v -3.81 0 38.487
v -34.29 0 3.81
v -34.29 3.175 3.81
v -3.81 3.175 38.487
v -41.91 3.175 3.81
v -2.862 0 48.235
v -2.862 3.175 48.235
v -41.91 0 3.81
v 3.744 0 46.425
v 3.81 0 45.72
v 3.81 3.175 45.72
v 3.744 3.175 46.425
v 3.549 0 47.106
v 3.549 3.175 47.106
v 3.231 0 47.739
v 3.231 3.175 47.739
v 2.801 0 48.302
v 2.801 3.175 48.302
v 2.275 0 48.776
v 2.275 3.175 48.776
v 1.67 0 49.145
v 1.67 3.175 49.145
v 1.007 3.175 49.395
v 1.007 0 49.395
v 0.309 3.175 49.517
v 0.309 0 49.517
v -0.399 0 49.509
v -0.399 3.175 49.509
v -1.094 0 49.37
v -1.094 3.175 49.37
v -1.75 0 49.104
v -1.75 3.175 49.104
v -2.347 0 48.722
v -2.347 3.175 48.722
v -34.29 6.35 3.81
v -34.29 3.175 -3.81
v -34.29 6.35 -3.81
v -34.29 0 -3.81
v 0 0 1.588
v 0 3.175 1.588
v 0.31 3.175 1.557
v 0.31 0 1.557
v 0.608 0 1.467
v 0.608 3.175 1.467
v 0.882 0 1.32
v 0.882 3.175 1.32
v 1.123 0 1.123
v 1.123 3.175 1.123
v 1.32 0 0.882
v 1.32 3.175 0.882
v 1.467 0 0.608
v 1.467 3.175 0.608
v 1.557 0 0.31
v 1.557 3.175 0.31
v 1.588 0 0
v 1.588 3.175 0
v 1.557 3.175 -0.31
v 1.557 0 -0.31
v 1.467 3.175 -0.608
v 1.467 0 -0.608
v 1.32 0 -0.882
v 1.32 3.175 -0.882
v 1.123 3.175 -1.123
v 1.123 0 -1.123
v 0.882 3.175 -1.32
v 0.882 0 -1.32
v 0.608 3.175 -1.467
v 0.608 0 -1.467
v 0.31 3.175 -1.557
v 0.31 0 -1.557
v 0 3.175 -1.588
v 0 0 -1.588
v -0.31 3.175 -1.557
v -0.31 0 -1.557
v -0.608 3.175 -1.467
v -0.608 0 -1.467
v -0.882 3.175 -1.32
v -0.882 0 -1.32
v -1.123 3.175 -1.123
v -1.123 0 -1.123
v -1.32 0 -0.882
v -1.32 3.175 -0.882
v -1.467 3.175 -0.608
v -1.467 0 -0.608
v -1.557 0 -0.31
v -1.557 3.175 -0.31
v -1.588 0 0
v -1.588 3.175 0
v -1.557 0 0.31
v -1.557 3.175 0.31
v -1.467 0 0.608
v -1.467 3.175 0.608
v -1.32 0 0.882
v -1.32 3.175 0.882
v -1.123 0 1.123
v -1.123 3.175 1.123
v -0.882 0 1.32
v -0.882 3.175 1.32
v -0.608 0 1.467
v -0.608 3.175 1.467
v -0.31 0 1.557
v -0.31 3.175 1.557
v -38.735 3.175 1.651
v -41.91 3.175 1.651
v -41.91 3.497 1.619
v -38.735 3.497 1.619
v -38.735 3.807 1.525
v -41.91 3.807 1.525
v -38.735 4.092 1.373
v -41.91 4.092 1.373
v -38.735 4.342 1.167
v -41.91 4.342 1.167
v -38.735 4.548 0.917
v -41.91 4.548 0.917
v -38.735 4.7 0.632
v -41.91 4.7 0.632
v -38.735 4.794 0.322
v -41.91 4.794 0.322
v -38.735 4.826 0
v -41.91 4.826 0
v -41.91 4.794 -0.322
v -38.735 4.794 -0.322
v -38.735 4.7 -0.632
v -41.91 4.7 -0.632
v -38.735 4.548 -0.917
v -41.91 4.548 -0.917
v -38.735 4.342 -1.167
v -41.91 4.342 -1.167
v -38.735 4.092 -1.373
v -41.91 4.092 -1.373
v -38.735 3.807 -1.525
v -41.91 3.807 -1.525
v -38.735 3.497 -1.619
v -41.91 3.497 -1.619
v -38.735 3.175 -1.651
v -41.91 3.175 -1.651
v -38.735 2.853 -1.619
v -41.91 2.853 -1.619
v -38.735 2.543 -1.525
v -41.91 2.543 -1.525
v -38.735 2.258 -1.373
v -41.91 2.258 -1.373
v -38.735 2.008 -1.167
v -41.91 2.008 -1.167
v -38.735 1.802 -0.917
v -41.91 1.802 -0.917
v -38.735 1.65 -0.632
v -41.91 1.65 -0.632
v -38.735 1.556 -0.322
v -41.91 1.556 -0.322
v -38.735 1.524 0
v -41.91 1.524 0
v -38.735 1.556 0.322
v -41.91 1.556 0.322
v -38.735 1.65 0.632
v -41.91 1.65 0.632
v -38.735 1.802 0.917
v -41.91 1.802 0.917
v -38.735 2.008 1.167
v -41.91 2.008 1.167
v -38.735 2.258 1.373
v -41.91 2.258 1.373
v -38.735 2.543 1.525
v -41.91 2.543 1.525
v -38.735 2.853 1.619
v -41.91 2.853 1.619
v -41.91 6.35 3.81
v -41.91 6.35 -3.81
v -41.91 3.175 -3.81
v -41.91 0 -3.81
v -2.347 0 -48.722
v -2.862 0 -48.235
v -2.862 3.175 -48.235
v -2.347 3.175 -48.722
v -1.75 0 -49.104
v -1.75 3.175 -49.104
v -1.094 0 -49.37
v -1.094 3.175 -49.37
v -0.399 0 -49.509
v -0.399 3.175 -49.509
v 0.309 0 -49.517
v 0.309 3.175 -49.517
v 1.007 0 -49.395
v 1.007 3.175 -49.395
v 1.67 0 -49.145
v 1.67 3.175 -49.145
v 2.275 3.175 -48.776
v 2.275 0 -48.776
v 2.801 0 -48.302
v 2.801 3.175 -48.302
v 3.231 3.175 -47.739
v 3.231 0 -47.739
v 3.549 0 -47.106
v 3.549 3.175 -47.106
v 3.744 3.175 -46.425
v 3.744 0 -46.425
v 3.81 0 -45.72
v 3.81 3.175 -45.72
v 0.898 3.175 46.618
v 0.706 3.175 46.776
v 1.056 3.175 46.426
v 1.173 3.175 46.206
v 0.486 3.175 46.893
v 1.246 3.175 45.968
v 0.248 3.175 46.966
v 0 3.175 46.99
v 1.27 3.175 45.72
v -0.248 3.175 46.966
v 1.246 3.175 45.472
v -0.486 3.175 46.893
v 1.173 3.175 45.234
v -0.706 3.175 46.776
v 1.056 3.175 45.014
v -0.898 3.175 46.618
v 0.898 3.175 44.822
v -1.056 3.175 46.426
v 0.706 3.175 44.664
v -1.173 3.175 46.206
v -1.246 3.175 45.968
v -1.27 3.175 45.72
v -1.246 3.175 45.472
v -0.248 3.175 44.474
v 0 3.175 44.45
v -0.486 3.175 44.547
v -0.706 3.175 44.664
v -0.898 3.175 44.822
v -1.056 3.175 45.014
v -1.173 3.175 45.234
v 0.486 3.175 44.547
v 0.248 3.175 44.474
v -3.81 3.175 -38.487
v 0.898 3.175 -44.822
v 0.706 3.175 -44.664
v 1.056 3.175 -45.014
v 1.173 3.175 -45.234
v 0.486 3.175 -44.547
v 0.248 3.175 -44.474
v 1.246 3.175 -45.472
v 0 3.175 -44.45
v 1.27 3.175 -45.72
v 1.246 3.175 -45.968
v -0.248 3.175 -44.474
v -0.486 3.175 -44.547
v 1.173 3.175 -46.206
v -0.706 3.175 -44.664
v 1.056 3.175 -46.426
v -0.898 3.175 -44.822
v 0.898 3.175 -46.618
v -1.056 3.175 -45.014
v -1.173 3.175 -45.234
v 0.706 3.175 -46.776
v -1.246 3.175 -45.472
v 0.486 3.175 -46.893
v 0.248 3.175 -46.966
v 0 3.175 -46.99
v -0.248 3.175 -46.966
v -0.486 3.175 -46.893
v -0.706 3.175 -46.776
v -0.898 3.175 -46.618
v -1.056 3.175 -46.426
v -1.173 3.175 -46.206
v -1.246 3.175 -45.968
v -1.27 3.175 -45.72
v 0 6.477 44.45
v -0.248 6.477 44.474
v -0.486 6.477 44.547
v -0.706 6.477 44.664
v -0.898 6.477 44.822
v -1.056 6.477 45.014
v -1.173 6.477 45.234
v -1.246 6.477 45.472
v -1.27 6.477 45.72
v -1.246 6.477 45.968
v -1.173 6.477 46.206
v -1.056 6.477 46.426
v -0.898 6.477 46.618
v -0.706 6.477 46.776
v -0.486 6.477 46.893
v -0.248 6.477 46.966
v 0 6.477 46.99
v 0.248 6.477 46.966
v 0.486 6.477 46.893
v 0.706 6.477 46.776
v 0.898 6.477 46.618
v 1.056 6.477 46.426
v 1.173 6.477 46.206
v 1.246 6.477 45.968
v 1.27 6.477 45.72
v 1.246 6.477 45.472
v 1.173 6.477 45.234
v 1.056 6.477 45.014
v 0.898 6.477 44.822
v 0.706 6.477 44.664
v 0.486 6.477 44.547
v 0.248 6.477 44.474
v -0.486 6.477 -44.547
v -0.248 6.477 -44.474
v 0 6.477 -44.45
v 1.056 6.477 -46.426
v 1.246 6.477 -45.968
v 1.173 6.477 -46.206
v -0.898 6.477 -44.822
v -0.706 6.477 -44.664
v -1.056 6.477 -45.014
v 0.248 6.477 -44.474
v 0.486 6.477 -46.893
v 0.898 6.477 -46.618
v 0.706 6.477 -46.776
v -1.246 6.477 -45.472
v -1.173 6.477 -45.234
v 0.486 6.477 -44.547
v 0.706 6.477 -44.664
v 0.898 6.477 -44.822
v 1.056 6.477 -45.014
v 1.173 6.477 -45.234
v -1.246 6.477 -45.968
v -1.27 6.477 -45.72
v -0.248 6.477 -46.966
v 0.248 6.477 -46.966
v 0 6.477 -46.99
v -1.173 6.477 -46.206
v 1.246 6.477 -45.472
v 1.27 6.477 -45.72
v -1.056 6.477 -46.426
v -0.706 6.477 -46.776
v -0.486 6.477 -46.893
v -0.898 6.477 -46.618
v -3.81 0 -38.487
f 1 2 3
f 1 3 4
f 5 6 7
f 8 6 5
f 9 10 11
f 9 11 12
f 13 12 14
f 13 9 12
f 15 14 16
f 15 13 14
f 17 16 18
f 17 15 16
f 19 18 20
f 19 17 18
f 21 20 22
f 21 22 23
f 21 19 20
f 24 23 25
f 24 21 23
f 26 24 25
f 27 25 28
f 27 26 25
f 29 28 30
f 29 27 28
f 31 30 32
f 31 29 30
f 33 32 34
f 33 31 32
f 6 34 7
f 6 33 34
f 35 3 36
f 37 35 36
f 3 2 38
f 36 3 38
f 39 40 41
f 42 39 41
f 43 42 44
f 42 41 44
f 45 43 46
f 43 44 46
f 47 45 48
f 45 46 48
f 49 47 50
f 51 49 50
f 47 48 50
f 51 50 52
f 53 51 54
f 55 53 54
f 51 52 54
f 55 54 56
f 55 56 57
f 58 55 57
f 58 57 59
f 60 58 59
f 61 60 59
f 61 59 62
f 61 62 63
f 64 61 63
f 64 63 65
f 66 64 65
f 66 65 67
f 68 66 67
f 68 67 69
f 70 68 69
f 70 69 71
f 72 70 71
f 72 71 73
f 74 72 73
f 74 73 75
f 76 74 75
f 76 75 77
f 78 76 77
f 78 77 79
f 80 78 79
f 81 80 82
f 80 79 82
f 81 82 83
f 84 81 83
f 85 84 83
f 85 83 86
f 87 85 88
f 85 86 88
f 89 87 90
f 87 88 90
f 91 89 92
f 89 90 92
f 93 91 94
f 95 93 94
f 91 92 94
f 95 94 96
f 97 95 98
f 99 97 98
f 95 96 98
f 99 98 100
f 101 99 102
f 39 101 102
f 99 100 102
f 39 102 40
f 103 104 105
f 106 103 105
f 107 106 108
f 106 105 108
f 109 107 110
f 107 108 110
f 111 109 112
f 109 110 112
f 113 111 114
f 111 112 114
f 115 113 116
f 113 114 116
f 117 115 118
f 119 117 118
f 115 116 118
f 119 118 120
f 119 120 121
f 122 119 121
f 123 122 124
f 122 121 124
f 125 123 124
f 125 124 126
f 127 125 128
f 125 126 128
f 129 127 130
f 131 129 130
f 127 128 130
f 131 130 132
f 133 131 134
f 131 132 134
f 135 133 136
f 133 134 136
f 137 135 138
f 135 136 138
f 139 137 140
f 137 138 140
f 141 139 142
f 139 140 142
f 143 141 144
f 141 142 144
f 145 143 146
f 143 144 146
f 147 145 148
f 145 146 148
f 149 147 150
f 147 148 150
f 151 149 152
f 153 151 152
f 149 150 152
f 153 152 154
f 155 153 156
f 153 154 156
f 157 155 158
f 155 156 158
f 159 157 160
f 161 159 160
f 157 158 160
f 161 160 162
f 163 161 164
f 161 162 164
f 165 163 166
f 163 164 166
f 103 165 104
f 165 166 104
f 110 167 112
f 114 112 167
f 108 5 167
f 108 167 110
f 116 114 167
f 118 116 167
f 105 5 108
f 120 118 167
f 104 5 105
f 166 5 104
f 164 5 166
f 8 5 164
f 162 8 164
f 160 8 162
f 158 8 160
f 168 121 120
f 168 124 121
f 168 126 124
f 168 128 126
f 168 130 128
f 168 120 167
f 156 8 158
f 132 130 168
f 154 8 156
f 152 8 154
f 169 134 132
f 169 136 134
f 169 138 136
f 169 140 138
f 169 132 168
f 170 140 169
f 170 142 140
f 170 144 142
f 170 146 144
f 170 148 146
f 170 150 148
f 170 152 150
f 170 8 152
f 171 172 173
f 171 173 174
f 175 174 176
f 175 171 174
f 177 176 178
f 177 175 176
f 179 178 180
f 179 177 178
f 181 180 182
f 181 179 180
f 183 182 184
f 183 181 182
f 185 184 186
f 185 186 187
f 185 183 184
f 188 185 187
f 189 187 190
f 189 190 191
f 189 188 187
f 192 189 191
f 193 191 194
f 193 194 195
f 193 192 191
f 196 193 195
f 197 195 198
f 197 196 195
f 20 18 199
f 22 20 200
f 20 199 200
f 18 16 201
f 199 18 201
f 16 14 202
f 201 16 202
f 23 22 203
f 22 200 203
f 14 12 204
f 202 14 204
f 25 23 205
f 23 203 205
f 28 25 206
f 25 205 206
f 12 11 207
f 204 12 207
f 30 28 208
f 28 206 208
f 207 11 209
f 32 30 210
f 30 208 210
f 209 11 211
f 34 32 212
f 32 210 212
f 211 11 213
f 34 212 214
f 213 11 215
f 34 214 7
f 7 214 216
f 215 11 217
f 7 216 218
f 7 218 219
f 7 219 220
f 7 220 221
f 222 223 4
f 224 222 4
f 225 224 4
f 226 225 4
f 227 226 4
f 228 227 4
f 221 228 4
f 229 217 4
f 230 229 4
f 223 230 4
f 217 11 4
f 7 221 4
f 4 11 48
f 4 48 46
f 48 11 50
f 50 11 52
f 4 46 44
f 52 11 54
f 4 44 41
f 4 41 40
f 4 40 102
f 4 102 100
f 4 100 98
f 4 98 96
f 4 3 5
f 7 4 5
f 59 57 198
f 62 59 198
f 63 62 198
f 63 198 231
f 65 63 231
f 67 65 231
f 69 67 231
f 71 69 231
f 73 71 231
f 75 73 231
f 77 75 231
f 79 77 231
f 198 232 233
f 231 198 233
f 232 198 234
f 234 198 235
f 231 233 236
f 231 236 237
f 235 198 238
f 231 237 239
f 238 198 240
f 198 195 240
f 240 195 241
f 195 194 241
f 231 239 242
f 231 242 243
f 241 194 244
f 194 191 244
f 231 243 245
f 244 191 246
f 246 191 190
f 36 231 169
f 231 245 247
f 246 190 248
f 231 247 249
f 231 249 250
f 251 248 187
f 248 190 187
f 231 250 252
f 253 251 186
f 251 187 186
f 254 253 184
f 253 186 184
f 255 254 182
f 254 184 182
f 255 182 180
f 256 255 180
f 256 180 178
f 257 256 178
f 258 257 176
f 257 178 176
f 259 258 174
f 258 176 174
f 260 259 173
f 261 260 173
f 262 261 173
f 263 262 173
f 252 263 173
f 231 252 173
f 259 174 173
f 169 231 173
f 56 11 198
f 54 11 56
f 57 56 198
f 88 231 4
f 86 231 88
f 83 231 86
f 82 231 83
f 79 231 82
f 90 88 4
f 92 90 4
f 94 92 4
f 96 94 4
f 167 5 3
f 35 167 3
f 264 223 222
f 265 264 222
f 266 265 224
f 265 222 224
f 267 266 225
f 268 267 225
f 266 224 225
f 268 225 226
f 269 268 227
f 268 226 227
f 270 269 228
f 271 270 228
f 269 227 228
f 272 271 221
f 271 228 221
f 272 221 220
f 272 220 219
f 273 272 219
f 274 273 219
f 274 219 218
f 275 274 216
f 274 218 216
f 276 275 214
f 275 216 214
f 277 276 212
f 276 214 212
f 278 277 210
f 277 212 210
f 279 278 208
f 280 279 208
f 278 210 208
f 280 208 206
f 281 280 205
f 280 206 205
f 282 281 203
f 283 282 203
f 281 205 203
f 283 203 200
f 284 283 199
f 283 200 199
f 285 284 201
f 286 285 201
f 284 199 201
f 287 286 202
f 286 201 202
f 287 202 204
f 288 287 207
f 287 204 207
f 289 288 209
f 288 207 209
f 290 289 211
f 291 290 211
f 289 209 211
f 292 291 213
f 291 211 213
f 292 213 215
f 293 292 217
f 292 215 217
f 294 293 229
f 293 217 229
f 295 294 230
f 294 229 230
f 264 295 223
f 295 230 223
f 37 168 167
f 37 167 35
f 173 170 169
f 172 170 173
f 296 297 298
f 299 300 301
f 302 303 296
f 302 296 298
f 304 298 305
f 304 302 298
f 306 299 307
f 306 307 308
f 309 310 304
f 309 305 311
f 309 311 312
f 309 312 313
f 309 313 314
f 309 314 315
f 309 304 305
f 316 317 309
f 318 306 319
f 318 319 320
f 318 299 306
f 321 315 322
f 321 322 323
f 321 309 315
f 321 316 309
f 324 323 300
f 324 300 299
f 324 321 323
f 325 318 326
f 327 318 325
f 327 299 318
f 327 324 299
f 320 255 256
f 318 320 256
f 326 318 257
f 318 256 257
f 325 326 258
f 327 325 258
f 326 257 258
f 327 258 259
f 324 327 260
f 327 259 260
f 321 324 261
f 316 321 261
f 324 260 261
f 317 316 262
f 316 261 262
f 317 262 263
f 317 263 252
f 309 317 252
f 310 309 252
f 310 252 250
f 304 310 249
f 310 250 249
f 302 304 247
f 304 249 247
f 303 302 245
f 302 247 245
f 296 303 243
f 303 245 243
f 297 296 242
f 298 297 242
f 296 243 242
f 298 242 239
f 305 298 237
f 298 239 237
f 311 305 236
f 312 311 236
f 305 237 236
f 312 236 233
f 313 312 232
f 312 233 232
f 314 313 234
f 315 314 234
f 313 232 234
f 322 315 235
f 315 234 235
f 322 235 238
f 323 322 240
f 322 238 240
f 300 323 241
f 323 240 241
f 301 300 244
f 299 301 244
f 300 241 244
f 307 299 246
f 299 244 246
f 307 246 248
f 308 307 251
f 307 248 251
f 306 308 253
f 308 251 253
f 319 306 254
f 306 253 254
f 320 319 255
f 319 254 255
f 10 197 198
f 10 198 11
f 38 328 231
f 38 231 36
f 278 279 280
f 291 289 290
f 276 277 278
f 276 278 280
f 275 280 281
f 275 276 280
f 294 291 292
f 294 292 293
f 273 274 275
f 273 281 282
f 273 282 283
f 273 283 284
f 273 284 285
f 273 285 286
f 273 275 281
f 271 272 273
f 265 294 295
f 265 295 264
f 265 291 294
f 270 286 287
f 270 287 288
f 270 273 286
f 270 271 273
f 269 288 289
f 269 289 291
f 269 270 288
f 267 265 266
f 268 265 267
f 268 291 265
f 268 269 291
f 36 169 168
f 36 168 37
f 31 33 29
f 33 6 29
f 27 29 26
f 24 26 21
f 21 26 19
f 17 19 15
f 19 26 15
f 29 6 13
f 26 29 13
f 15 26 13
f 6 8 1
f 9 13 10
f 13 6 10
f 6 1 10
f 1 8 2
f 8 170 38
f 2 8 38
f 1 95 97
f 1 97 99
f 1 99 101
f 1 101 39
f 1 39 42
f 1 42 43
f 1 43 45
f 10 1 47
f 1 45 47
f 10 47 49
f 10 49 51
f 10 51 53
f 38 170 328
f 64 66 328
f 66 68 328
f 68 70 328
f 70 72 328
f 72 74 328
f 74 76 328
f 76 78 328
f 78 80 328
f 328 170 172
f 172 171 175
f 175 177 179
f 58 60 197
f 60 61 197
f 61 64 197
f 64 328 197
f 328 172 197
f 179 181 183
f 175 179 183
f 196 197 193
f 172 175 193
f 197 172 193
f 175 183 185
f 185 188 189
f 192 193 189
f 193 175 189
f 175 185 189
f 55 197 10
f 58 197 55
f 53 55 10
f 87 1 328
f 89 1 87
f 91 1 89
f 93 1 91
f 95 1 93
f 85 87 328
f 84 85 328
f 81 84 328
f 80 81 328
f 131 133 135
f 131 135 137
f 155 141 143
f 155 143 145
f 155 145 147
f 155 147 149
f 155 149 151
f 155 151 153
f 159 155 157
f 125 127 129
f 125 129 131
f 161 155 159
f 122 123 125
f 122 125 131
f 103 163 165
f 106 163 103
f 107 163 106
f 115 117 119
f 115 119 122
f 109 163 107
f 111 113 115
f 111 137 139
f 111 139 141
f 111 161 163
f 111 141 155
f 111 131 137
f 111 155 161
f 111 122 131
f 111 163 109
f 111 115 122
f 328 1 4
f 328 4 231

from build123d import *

# Parameters (mm, degrees)
BOSS_EXTRUDE1_DEPTH = 3.175
SKETCH3_W           = 7.62
SKETCH3_H           = 7.62
BOSS_EXTRUDE2_DEPTH = 6.35
CUT_EXTRUDE1_REACH  = 66.96
SKETCH5_R           = 1.5875
SKETCH6_R           = 1.27
BOSS_EXTRUDE3_DEPTH = 3.302
SKETCH9_R           = 1.651
CUT_EXTRUDE3_DEPTH  = 3.175


with BuildPart() as part:
    # Sketch2 → Boss-Extrude1 (new body)
    with BuildSketch(Plane(origin=(0, 0, 0), x_dir=(1, 0, 0), z_dir=(0, 1, 0))):
        with BuildLine():
            Line((3.81, 45.72), (3.81, -45.72))
            ThreePointArc((3.81, -45.72), (1.344074772, -49.285047406), (-2.861686618, -48.235322981))
            Line((-2.861686618, -48.235322981), (-41.91, -3.81))
            Line((-41.91, -3.81), (-34.29, -3.81))
            Line((-34.29, -3.81), (-3.81, -38.487140373))
            Line((-3.81, -38.487140373), (-3.81, 38.487140373))
            Line((-3.81, 38.487140373), (-34.29, 3.81))
            Line((-34.29, 3.81), (-41.91, 3.81))
            Line((-41.91, 3.81), (-2.861686618, 48.235322981))
            ThreePointArc((-2.861686618, 48.235322981), (1.344074772, 49.285047406), (3.81, 45.72))
        make_face()
    extrude(amount=BOSS_EXTRUDE1_DEPTH)

    # Sketch3 → Boss-Extrude2 (add)
    with BuildSketch(Plane(origin=(0, 0, 0), x_dir=(1, 0, 0), z_dir=(0, 1, 0))):
        with Locations((-38.1, 0)):
            Rectangle(SKETCH3_W, SKETCH3_H)
    extrude(amount=BOSS_EXTRUDE2_DEPTH)

    # Sketch5 → Cut-Extrude1 (cut, up to next)
    with BuildSketch(Plane(origin=(0, 3.175, 0), x_dir=(1, 0, 0), z_dir=(0, 1, 0)), mode=Mode.PRIVATE) as cut_extrude1_sk1:
        with Locations(Location((0, 0, 0), (0, 0, 270))):
            Circle(SKETCH5_R)
    cut_extrude1_tool1 = extrude(cut_extrude1_sk1.sketch, amount=-CUT_EXTRUDE1_REACH, mode=Mode.PRIVATE) & part.part
    add(cut_extrude1_tool1.solids().sort_by_distance((0, 3.175, 0))[0], mode=Mode.SUBTRACT)

    # Sketch6 → Boss-Extrude3 (add)
    with BuildSketch(Plane(origin=(0, 3.175, 0), x_dir=(1, 0, 0), z_dir=(0, 1, 0))):
        with Locations(Location((0, 45.72, 0), (0, 0, 90))):
            Circle(SKETCH6_R)
        with Locations(Location((0, -45.72, 0), (0, 0, 90))):
            Circle(SKETCH6_R)
    extrude(amount=BOSS_EXTRUDE3_DEPTH)

    # Sketch9 → Cut-Extrude3 (cut)
    with BuildSketch(Plane.ZY.offset(41.91)):
        with Locations((0, 3.175)):
            Circle(SKETCH9_R)
    extrude(amount=-CUT_EXTRUDE3_DEPTH, mode=Mode.SUBTRACT)


solid = part.part
